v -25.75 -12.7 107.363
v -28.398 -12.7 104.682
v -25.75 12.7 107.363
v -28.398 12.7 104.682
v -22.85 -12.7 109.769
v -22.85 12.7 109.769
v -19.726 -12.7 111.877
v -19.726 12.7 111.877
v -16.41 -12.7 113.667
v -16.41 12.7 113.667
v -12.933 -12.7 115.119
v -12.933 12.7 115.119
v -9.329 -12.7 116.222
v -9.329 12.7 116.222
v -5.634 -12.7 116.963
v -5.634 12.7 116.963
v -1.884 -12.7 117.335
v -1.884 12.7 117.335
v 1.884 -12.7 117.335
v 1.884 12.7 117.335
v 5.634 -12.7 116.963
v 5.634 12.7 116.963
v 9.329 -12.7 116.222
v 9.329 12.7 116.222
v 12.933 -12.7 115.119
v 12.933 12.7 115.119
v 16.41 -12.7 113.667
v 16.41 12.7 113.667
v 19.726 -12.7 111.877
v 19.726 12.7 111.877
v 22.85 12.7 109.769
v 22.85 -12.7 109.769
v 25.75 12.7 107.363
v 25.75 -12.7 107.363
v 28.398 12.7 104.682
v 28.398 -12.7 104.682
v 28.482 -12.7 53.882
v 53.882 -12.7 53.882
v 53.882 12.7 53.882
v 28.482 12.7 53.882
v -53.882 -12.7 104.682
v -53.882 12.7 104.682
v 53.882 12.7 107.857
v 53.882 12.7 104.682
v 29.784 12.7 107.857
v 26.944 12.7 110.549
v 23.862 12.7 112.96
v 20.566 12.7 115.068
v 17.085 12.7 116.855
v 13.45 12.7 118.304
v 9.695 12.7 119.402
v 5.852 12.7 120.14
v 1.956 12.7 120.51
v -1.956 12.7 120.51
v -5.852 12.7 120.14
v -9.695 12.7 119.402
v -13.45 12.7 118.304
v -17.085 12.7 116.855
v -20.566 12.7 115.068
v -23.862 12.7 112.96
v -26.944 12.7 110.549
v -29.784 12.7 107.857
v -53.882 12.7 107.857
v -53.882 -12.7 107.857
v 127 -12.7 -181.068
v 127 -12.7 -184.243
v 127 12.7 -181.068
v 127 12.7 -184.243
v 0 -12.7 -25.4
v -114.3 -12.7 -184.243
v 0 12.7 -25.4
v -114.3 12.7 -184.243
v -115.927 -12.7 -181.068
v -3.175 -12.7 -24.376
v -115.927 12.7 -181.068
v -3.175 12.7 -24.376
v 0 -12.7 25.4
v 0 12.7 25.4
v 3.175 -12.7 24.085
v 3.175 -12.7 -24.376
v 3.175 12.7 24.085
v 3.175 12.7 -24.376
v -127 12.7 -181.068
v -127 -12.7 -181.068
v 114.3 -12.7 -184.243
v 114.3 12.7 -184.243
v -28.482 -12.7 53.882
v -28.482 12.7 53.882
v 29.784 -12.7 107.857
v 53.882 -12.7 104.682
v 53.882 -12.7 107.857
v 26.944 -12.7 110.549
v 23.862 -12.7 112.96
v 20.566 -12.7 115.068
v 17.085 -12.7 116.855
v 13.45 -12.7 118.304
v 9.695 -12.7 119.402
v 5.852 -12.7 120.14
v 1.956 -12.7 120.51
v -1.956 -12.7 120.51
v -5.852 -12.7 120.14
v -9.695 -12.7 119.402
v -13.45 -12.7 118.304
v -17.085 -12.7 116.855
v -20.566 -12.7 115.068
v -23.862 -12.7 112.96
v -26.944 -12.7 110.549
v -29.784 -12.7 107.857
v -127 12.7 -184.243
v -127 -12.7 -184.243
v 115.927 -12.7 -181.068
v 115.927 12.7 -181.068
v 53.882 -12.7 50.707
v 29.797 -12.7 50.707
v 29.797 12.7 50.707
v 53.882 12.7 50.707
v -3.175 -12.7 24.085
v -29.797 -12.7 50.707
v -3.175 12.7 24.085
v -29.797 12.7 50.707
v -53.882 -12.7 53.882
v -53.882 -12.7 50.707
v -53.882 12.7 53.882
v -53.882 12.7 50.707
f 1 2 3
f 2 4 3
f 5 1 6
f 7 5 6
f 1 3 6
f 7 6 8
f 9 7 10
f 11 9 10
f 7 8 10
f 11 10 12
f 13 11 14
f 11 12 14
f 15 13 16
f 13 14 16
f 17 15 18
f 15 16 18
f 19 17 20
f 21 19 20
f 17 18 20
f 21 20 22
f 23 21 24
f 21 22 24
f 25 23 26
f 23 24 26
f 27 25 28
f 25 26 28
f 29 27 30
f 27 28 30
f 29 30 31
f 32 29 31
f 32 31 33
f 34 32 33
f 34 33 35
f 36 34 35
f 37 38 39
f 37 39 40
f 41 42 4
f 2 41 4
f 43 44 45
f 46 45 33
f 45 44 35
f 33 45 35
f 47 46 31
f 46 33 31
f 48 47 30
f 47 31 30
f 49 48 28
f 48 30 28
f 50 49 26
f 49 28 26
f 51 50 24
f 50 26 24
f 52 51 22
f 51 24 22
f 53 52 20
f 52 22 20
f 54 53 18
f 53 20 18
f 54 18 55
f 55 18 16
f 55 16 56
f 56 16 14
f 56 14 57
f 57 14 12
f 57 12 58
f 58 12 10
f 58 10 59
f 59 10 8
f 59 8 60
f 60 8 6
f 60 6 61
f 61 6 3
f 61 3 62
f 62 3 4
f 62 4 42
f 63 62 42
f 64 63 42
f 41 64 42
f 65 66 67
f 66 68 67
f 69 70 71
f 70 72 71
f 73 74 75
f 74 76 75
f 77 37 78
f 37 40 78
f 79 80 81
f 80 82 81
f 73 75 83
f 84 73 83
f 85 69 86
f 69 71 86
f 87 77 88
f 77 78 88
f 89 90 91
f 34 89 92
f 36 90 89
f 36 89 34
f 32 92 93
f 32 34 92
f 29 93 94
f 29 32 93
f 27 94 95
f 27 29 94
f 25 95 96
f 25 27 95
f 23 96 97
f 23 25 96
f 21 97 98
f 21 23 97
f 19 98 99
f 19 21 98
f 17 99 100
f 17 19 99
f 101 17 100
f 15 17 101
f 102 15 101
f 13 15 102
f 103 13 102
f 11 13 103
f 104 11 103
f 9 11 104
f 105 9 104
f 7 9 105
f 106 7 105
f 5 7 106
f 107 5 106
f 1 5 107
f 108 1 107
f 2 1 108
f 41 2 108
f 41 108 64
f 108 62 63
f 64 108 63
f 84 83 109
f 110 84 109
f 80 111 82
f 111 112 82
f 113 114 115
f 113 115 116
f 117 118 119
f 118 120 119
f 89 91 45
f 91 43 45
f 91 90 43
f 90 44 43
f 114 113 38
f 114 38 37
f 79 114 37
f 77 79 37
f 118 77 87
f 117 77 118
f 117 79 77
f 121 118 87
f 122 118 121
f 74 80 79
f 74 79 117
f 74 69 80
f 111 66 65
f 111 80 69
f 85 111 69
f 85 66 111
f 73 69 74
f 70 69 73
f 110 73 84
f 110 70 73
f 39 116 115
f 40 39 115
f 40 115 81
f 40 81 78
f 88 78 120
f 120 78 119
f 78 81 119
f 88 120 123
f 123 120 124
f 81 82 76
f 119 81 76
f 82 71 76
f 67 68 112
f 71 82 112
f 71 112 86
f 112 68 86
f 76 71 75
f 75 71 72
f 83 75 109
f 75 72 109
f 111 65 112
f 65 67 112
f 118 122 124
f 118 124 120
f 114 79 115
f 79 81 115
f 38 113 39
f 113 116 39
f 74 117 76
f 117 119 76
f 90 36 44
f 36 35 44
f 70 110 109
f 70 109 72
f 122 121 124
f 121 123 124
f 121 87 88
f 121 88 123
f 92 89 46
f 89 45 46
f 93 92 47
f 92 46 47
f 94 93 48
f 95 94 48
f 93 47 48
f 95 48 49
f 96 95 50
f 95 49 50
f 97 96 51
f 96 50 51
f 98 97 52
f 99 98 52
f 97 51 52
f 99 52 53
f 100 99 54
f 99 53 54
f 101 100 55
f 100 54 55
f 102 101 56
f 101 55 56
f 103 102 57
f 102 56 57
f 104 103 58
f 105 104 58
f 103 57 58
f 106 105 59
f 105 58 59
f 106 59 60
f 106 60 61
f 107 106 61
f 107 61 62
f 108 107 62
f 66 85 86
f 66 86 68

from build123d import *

# Parameters (mm, degrees)
BOSS_EXTRUDE1_DEPTH   = 12.7
BOSS_EXTRUDE1_2_DEPTH = 12.7


with BuildPart() as part:
    # Sketch1 → Boss-Extrude1 (new body, symmetric)
    with BuildSketch(Plane(origin=(0, 0, 0), x_dir=(1, 0, 0), z_dir=(0, 1, 0))):
        Polygon((-127, 184.243463274), (-114.3, 184.243463274), (0, 25.4), (114.3, 184.243463274), (127, 184.243463274), (127, 181.068463274), (115.926901433, 181.068463274), (3.175, 24.376402781), (3.175, -24.084871939), (29.796664787, -50.706536726), (53.881536726, -50.706536726), (53.881536726, -53.881536726), (28.481536726, -53.881536726), (0, -25.4), (-28.481536726, -53.881536726), (-53.881536726, -53.881536726), (-53.881536726, -50.706536726), (-29.796664787, -50.706536726), (-3.175, -24.084871939), (-3.175, 24.376402781), (-115.926901433, 181.068463274), (-127, 181.068463274), align=None)
    extrude(amount=BOSS_EXTRUDE1_DEPTH, both=True)


with BuildPart() as body_2:
    # Sketch1 → Boss-Extrude1 2 (new body, symmetric)
    with BuildSketch(Plane(origin=(0, 0, 0), x_dir=(1, 0, 0), z_dir=(0, 1, 0))):
        with BuildLine():
            Line((-53.881536726, -104.681536726), (-28.398063314, -104.681536726))
            ThreePointArc((-28.398063314, -104.681536726), (0, -117.381536726), (28.398063314, -104.681536726))
            Line((28.398063314, -104.681536726), (53.881536726, -104.681536726))
            Line((53.881536726, -104.681536726), (53.881536726, -107.856536726))
            Line((53.881536726, -107.856536726), (29.784140075, -107.856536726))
            ThreePointArc((29.784140075, -107.856536726), (0, -120.556536726), (-29.784140075, -107.856536726))
            Line((-29.784140075, -107.856536726), (-53.881536726, -107.856536726))
            Line((-53.881536726, -107.856536726), (-53.881536726, -104.681536726))
        make_face()
    extrude(amount=BOSS_EXTRUDE1_2_DEPTH, both=True)


solid = Compound([part.part, body_2.part])
